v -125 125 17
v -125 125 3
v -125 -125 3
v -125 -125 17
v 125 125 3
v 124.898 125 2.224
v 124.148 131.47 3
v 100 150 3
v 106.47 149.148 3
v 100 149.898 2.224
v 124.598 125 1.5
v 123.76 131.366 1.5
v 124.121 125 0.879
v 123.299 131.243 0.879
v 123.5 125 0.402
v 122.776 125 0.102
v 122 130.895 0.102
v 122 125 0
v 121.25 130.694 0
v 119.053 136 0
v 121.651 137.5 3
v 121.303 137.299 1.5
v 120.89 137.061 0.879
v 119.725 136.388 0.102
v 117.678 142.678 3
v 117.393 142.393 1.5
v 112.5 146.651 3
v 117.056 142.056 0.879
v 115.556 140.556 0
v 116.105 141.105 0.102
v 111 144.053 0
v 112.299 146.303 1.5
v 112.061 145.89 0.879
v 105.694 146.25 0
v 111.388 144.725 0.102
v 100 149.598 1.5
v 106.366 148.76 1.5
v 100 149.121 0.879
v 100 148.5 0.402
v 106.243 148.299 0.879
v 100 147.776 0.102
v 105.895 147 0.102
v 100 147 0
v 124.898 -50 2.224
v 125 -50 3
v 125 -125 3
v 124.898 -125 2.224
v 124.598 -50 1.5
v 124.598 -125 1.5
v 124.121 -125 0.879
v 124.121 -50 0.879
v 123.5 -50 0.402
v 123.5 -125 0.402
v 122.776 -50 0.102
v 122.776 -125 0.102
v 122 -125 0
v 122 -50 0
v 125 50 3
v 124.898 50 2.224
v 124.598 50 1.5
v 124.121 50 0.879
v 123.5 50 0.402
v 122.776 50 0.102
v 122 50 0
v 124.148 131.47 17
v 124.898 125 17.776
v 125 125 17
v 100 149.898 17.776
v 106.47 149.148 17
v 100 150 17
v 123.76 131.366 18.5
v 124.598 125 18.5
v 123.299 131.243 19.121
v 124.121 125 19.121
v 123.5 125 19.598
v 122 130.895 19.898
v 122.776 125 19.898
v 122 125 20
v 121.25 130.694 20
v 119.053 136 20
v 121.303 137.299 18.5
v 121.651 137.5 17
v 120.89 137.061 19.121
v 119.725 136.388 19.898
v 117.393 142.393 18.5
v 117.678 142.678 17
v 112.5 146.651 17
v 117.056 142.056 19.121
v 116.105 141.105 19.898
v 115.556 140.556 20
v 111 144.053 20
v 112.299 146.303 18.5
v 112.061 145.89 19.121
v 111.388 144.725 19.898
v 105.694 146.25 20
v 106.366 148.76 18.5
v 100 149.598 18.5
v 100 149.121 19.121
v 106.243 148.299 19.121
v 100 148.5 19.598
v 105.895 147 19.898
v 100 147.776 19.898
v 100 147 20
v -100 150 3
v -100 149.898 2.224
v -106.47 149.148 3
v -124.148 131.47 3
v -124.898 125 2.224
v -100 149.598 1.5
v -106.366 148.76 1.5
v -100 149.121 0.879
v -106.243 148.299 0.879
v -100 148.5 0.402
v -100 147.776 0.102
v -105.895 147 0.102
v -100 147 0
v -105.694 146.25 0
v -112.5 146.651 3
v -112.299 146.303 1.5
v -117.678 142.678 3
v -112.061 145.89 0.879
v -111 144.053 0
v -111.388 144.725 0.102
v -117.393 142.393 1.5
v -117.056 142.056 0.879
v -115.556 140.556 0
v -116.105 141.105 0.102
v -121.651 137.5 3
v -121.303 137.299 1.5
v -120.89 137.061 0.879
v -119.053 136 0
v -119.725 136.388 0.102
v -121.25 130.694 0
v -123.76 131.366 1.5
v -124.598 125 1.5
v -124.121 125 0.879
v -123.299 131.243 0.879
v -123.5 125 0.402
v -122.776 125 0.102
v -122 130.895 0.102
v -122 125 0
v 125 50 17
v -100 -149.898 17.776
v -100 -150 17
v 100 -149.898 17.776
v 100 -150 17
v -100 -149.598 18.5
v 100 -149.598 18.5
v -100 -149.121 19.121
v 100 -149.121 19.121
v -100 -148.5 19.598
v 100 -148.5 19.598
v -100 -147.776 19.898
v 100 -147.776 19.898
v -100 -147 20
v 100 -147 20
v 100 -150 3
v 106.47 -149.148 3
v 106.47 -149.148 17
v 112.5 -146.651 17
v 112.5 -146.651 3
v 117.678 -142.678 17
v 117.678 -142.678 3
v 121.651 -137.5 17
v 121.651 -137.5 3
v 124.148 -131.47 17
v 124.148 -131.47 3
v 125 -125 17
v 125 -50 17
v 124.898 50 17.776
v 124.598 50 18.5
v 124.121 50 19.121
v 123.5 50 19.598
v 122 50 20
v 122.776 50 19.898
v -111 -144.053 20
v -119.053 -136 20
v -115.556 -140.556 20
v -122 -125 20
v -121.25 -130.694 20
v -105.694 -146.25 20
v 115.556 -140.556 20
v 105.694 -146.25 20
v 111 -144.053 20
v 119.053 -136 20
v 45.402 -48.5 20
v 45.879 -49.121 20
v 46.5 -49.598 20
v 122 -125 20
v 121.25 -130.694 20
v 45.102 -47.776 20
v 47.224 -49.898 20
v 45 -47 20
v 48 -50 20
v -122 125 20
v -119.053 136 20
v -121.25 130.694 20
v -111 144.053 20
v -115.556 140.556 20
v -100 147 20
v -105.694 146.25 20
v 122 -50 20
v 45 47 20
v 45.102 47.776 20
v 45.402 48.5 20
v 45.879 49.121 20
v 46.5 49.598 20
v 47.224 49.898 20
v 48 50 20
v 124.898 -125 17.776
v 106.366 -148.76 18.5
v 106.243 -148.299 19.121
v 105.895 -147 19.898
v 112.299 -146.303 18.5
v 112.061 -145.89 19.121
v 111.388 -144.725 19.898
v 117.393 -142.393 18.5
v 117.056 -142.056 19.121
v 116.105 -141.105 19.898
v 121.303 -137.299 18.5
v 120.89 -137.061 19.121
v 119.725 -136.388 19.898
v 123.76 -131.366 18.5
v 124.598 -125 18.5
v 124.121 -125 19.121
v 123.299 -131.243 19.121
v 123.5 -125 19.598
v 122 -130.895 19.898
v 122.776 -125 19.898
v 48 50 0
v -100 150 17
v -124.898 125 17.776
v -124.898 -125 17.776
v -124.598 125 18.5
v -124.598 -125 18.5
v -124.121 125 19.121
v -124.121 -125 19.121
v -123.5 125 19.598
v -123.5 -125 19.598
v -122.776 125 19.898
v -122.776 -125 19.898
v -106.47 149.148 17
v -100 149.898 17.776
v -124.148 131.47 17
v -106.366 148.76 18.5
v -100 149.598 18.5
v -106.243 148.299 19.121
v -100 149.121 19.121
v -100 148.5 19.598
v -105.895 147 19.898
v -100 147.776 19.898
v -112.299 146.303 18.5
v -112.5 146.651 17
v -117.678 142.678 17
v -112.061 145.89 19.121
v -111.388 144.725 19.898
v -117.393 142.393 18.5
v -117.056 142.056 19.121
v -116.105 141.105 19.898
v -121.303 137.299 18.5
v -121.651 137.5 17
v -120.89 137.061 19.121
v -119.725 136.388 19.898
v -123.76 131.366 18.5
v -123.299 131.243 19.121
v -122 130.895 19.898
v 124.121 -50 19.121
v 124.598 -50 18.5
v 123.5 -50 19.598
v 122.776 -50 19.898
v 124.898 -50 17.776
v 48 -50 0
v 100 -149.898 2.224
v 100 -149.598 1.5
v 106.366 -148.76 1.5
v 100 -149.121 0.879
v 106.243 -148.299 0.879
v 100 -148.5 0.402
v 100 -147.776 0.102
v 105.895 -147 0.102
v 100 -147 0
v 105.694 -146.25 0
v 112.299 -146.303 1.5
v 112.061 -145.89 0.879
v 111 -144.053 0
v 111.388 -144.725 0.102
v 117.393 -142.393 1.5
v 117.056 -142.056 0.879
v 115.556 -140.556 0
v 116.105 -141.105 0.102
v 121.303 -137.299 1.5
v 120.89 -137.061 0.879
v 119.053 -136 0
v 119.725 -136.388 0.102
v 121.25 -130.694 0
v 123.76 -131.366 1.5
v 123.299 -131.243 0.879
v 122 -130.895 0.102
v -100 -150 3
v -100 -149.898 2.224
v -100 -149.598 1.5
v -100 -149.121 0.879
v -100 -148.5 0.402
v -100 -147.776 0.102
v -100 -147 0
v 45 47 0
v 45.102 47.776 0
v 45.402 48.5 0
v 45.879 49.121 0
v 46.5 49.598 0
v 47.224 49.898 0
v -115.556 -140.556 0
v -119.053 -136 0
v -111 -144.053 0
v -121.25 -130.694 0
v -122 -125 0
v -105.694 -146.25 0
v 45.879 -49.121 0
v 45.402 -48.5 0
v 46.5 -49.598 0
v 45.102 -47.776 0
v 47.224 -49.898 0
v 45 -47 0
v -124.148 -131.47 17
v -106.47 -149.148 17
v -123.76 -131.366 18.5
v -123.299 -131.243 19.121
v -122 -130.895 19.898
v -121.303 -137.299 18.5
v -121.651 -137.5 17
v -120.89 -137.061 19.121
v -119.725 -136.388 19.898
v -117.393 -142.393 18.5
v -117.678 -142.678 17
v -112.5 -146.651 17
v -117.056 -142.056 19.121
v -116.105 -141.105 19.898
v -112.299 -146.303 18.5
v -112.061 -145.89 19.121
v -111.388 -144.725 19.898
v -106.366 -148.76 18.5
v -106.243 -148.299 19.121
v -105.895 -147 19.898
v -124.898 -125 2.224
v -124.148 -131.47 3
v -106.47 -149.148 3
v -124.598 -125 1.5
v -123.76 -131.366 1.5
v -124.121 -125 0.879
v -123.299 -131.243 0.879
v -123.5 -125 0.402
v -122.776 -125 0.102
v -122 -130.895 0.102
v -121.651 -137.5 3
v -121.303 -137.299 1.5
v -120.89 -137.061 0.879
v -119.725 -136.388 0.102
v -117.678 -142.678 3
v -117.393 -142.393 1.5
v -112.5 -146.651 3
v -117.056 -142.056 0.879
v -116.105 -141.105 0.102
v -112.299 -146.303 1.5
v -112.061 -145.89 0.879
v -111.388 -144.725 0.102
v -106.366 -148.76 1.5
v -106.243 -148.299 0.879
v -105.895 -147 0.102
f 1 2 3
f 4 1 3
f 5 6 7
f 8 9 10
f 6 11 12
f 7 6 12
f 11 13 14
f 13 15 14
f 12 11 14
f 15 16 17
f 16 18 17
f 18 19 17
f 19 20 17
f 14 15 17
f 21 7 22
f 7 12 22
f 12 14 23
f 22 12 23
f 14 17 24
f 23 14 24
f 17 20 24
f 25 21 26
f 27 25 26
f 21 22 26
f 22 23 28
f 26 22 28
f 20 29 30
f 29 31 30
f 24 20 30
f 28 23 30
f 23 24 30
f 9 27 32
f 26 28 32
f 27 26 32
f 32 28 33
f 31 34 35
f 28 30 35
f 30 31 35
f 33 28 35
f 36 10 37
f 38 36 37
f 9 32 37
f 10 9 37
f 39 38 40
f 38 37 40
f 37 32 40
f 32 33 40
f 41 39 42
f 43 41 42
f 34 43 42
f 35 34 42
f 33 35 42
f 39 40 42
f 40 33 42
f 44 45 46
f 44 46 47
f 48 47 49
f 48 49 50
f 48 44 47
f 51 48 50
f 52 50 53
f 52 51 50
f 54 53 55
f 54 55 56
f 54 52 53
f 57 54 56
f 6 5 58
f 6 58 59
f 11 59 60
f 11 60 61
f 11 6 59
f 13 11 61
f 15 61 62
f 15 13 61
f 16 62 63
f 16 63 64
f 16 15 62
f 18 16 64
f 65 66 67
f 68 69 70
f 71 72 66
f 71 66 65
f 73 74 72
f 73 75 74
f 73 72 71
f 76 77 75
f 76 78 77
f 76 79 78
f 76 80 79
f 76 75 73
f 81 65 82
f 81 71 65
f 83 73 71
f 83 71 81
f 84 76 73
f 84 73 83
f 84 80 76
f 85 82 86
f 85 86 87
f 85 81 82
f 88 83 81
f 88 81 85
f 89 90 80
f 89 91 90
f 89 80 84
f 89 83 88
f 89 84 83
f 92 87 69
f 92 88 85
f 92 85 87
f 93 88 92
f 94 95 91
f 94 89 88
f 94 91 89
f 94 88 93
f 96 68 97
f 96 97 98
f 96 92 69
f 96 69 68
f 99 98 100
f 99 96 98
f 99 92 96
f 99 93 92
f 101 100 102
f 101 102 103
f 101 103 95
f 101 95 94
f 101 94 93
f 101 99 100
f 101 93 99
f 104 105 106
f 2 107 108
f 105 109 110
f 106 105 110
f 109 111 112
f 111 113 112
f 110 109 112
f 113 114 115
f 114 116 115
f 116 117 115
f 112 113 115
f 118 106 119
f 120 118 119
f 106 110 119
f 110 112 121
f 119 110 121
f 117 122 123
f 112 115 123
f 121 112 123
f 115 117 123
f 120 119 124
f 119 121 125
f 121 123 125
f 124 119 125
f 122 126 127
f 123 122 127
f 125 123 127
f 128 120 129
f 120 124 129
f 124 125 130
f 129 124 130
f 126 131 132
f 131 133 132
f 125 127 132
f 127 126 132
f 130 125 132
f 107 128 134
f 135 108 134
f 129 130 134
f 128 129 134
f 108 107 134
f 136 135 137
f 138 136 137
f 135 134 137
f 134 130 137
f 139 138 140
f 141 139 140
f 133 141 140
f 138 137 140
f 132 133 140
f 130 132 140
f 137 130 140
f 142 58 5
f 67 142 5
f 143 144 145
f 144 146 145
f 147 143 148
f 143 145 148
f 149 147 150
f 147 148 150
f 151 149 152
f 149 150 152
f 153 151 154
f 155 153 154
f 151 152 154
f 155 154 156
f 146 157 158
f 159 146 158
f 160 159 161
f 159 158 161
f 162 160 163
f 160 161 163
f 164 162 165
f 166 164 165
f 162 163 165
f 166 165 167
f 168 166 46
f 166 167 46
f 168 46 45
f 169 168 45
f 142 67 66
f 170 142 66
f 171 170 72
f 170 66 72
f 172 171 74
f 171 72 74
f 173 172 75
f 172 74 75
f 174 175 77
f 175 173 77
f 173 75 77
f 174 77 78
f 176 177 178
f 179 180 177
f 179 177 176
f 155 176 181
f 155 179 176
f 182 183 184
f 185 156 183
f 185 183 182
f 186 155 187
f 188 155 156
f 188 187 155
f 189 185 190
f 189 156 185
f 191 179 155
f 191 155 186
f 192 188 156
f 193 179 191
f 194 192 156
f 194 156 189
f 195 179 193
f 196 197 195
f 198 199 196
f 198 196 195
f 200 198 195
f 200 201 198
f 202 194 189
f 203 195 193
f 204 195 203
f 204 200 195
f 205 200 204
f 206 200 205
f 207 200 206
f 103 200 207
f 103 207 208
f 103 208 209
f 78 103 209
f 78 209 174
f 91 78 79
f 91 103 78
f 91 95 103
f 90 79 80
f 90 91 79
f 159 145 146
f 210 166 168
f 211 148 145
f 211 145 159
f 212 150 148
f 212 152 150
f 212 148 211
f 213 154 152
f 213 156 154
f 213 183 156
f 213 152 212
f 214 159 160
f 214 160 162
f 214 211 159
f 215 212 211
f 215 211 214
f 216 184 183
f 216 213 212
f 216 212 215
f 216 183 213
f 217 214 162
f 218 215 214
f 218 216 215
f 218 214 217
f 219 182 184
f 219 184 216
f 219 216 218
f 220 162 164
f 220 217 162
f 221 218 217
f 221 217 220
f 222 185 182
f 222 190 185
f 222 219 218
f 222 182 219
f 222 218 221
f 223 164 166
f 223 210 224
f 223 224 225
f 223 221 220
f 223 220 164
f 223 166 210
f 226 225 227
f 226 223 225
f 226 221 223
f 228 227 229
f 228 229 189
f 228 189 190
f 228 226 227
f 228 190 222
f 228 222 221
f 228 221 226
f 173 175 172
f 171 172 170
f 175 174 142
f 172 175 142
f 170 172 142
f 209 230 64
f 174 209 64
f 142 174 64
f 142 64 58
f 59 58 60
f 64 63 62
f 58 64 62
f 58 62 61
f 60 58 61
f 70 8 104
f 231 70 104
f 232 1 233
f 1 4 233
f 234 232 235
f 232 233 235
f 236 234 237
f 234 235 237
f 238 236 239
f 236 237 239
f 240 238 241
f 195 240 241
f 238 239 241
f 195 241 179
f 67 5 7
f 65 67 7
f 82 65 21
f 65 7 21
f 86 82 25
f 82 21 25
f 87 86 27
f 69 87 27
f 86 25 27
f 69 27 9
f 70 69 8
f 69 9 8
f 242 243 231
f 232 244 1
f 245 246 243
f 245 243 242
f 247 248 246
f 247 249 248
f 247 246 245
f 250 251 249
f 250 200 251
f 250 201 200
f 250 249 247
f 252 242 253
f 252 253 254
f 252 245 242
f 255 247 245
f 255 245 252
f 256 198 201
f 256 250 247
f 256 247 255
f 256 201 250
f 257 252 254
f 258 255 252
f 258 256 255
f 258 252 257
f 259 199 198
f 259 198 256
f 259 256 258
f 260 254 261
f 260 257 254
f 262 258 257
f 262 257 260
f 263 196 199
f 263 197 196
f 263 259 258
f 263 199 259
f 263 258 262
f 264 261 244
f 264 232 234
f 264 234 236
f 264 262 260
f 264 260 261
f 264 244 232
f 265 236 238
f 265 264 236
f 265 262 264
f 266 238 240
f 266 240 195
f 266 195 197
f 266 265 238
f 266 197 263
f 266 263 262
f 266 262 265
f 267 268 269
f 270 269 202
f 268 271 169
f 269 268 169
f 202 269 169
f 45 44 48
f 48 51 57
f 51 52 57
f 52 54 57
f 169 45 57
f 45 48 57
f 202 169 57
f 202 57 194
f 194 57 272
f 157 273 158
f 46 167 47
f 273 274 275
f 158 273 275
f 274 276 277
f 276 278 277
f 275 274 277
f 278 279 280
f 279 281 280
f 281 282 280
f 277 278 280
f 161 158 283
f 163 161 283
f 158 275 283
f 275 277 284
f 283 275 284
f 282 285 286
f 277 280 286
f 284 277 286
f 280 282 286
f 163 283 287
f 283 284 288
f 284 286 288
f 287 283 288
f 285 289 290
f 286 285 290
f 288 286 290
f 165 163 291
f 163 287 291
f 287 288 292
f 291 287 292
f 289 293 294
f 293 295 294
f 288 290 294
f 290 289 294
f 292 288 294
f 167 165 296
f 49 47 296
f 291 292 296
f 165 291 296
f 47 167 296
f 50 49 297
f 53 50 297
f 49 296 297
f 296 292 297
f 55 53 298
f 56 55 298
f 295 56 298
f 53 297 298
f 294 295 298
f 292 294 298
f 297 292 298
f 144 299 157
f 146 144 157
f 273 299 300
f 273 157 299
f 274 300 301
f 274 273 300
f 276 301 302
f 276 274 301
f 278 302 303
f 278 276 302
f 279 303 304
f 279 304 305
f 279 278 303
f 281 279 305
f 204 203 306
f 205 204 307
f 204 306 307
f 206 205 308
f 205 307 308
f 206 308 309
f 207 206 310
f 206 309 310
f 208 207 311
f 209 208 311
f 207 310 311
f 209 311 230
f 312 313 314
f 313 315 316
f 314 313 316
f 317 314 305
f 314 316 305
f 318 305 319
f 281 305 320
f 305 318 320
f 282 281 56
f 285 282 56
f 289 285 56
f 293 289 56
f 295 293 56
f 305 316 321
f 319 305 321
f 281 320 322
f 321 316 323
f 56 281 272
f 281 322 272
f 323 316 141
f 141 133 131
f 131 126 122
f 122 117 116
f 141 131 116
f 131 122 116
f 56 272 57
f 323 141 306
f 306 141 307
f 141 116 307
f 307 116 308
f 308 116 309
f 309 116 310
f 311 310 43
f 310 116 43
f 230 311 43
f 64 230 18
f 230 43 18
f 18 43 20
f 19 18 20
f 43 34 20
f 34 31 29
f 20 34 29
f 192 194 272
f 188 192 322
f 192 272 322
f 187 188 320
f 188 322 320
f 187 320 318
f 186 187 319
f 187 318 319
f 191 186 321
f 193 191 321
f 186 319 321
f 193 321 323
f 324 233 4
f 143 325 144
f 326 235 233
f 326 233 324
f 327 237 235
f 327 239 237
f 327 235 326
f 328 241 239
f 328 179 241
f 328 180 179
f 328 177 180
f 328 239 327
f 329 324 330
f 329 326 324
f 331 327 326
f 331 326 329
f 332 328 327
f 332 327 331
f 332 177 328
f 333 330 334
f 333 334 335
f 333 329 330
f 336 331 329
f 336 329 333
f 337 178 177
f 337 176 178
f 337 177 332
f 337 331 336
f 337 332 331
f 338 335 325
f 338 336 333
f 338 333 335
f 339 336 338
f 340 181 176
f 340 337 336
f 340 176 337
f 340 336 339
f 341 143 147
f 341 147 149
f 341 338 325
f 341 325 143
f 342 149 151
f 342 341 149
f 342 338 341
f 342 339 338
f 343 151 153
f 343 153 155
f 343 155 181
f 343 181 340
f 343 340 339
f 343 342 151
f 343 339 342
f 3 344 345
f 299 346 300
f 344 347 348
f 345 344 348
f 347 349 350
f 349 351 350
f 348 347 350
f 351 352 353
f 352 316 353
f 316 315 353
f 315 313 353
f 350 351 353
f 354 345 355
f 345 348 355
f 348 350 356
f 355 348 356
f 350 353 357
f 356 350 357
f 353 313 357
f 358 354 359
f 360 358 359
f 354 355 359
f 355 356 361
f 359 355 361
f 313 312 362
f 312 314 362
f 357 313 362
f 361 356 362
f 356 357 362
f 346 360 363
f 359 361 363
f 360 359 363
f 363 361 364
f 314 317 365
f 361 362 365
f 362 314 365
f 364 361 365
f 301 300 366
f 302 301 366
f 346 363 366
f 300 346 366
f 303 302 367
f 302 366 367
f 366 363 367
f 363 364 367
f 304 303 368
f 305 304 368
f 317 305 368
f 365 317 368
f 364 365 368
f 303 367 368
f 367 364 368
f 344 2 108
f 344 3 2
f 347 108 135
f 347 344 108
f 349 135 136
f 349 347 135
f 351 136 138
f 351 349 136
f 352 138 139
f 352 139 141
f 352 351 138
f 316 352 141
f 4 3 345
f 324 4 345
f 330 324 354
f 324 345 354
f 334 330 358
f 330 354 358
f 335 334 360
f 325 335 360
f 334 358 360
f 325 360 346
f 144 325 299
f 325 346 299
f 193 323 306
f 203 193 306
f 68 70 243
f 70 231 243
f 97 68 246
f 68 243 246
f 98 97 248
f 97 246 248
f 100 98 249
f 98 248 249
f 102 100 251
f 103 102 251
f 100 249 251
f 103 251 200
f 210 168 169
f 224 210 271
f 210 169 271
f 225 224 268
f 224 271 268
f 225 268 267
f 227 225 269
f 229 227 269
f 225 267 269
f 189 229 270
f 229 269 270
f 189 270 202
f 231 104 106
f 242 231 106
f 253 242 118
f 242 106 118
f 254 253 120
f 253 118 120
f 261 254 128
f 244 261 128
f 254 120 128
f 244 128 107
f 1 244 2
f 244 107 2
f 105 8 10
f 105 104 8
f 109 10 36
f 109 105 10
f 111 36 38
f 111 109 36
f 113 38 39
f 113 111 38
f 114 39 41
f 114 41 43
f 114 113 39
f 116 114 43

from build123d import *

# Parameters (mm, degrees)
F1_DEPTH = 20
F2_R     = 3
F3_W     = 3
F3_H     = 18
F4_DEPTH = 25
F6_W     = 3
F6_H     = 64
F7_DEPTH = 25


with BuildPart() as f1:
    # F0 (on Top) → F1 (new body)
    with BuildSketch(Plane.XY):
        with BuildLine():
            Line((-100, -150), (100, -150))
            ThreePointArc((100, -150), (117.67767, -142.67767), (125, -125))
            Line((125, -125), (125, 125))
            ThreePointArc((125, 125), (117.67767, 142.67767), (100, 150))
            Line((100, 150), (-100, 150))
            ThreePointArc((-100, 150), (-117.67767, 142.67767), (-125, 125))
            Line((-125, 125), (-125, -125))
            ThreePointArc((-125, -125), (-117.67767, -142.67767), (-100, -150))
        make_face()
    extrude(amount=F1_DEPTH)

    # F2
    f2_edges = [f1.edges().sort_by_distance(p)[0] for p in [
        (-117.67767, -142.67767, 20),
        (0, -150, 20),
        (117.67767, -142.67767, 20),
        (125, 0, 20),
        (117.67767, 142.67767, 20),
        (0, 150, 20),
        (-117.67767, 142.67767, 20),
        (-125, 0, 20),
        (-117.67767, -142.67767, 0),
        (0, -150, 0),
        (117.67767, -142.67767, 0),
        (125, 0, 0),
        (117.67767, 142.67767, 0),
        (0, 150, 0),
        (-117.67767, 142.67767, 0),
        (-125, 0, 0),
    ]]
    fillet(f2_edges, radius=F2_R)

    # F3 (on face) → F4 (cut)
    with BuildSketch(Plane(origin=(0, 0, 0), x_dir=(1, 0, 0), z_dir=(0, 0, -1))):
        with BuildLine():
            Line((122, 32), (122, 50))
            Line((122, 50), (48, 50))
            ThreePointArc((48, 50), (45.87868, 49.12132), (45, 47))
            Line((45, 47), (45, 35))
            ThreePointArc((45, 35), (45.87868, 32.87868), (48, 32))
            Line((48, 32), (122, 32))
        make_face()
        with Locations((123.5, 41)):
            Rectangle(F3_W, F3_H)
        with Locations((123.5, -41)):
            Rectangle(F3_W, F3_H)
        with BuildLine():
            Line((122, -50), (122, -32))
            Line((122, -32), (48, -32))
            ThreePointArc((48, -32), (45.87868, -32.87868), (45, -35))
            Line((45, -35), (45, -47))
            ThreePointArc((45, -47), (45.87868, -49.12132), (48, -50))
            Line((48, -50), (122, -50))
        make_face()
    extrude(amount=-F4_DEPTH, mode=Mode.SUBTRACT)

    # F3 (on face) + F6 (on face) → F7 (cut)
    with BuildSketch(Plane(origin=(0, 0, 0), x_dir=(1, 0, 0), z_dir=(0, 0, -1))):
        with BuildLine():
            Line((122, -32), (122, 32))
            Line((122, 32), (48, 32))
            ThreePointArc((48, 32), (45.87868, 32.87868), (45, 35))
            Line((45, 35), (45, -35))
            ThreePointArc((45, -35), (45.87868, -32.87868), (48, -32))
            Line((48, -32), (122, -32))
        make_face()
    with BuildSketch(Plane(origin=(0, 0, 0), x_dir=(1, 0, 0), z_dir=(0, 0, -1))):
        with Locations((123.5, 0)):
            Rectangle(F6_W, F6_H)
    extrude(amount=-F7_DEPTH, mode=Mode.SUBTRACT)


solid = f1.part
